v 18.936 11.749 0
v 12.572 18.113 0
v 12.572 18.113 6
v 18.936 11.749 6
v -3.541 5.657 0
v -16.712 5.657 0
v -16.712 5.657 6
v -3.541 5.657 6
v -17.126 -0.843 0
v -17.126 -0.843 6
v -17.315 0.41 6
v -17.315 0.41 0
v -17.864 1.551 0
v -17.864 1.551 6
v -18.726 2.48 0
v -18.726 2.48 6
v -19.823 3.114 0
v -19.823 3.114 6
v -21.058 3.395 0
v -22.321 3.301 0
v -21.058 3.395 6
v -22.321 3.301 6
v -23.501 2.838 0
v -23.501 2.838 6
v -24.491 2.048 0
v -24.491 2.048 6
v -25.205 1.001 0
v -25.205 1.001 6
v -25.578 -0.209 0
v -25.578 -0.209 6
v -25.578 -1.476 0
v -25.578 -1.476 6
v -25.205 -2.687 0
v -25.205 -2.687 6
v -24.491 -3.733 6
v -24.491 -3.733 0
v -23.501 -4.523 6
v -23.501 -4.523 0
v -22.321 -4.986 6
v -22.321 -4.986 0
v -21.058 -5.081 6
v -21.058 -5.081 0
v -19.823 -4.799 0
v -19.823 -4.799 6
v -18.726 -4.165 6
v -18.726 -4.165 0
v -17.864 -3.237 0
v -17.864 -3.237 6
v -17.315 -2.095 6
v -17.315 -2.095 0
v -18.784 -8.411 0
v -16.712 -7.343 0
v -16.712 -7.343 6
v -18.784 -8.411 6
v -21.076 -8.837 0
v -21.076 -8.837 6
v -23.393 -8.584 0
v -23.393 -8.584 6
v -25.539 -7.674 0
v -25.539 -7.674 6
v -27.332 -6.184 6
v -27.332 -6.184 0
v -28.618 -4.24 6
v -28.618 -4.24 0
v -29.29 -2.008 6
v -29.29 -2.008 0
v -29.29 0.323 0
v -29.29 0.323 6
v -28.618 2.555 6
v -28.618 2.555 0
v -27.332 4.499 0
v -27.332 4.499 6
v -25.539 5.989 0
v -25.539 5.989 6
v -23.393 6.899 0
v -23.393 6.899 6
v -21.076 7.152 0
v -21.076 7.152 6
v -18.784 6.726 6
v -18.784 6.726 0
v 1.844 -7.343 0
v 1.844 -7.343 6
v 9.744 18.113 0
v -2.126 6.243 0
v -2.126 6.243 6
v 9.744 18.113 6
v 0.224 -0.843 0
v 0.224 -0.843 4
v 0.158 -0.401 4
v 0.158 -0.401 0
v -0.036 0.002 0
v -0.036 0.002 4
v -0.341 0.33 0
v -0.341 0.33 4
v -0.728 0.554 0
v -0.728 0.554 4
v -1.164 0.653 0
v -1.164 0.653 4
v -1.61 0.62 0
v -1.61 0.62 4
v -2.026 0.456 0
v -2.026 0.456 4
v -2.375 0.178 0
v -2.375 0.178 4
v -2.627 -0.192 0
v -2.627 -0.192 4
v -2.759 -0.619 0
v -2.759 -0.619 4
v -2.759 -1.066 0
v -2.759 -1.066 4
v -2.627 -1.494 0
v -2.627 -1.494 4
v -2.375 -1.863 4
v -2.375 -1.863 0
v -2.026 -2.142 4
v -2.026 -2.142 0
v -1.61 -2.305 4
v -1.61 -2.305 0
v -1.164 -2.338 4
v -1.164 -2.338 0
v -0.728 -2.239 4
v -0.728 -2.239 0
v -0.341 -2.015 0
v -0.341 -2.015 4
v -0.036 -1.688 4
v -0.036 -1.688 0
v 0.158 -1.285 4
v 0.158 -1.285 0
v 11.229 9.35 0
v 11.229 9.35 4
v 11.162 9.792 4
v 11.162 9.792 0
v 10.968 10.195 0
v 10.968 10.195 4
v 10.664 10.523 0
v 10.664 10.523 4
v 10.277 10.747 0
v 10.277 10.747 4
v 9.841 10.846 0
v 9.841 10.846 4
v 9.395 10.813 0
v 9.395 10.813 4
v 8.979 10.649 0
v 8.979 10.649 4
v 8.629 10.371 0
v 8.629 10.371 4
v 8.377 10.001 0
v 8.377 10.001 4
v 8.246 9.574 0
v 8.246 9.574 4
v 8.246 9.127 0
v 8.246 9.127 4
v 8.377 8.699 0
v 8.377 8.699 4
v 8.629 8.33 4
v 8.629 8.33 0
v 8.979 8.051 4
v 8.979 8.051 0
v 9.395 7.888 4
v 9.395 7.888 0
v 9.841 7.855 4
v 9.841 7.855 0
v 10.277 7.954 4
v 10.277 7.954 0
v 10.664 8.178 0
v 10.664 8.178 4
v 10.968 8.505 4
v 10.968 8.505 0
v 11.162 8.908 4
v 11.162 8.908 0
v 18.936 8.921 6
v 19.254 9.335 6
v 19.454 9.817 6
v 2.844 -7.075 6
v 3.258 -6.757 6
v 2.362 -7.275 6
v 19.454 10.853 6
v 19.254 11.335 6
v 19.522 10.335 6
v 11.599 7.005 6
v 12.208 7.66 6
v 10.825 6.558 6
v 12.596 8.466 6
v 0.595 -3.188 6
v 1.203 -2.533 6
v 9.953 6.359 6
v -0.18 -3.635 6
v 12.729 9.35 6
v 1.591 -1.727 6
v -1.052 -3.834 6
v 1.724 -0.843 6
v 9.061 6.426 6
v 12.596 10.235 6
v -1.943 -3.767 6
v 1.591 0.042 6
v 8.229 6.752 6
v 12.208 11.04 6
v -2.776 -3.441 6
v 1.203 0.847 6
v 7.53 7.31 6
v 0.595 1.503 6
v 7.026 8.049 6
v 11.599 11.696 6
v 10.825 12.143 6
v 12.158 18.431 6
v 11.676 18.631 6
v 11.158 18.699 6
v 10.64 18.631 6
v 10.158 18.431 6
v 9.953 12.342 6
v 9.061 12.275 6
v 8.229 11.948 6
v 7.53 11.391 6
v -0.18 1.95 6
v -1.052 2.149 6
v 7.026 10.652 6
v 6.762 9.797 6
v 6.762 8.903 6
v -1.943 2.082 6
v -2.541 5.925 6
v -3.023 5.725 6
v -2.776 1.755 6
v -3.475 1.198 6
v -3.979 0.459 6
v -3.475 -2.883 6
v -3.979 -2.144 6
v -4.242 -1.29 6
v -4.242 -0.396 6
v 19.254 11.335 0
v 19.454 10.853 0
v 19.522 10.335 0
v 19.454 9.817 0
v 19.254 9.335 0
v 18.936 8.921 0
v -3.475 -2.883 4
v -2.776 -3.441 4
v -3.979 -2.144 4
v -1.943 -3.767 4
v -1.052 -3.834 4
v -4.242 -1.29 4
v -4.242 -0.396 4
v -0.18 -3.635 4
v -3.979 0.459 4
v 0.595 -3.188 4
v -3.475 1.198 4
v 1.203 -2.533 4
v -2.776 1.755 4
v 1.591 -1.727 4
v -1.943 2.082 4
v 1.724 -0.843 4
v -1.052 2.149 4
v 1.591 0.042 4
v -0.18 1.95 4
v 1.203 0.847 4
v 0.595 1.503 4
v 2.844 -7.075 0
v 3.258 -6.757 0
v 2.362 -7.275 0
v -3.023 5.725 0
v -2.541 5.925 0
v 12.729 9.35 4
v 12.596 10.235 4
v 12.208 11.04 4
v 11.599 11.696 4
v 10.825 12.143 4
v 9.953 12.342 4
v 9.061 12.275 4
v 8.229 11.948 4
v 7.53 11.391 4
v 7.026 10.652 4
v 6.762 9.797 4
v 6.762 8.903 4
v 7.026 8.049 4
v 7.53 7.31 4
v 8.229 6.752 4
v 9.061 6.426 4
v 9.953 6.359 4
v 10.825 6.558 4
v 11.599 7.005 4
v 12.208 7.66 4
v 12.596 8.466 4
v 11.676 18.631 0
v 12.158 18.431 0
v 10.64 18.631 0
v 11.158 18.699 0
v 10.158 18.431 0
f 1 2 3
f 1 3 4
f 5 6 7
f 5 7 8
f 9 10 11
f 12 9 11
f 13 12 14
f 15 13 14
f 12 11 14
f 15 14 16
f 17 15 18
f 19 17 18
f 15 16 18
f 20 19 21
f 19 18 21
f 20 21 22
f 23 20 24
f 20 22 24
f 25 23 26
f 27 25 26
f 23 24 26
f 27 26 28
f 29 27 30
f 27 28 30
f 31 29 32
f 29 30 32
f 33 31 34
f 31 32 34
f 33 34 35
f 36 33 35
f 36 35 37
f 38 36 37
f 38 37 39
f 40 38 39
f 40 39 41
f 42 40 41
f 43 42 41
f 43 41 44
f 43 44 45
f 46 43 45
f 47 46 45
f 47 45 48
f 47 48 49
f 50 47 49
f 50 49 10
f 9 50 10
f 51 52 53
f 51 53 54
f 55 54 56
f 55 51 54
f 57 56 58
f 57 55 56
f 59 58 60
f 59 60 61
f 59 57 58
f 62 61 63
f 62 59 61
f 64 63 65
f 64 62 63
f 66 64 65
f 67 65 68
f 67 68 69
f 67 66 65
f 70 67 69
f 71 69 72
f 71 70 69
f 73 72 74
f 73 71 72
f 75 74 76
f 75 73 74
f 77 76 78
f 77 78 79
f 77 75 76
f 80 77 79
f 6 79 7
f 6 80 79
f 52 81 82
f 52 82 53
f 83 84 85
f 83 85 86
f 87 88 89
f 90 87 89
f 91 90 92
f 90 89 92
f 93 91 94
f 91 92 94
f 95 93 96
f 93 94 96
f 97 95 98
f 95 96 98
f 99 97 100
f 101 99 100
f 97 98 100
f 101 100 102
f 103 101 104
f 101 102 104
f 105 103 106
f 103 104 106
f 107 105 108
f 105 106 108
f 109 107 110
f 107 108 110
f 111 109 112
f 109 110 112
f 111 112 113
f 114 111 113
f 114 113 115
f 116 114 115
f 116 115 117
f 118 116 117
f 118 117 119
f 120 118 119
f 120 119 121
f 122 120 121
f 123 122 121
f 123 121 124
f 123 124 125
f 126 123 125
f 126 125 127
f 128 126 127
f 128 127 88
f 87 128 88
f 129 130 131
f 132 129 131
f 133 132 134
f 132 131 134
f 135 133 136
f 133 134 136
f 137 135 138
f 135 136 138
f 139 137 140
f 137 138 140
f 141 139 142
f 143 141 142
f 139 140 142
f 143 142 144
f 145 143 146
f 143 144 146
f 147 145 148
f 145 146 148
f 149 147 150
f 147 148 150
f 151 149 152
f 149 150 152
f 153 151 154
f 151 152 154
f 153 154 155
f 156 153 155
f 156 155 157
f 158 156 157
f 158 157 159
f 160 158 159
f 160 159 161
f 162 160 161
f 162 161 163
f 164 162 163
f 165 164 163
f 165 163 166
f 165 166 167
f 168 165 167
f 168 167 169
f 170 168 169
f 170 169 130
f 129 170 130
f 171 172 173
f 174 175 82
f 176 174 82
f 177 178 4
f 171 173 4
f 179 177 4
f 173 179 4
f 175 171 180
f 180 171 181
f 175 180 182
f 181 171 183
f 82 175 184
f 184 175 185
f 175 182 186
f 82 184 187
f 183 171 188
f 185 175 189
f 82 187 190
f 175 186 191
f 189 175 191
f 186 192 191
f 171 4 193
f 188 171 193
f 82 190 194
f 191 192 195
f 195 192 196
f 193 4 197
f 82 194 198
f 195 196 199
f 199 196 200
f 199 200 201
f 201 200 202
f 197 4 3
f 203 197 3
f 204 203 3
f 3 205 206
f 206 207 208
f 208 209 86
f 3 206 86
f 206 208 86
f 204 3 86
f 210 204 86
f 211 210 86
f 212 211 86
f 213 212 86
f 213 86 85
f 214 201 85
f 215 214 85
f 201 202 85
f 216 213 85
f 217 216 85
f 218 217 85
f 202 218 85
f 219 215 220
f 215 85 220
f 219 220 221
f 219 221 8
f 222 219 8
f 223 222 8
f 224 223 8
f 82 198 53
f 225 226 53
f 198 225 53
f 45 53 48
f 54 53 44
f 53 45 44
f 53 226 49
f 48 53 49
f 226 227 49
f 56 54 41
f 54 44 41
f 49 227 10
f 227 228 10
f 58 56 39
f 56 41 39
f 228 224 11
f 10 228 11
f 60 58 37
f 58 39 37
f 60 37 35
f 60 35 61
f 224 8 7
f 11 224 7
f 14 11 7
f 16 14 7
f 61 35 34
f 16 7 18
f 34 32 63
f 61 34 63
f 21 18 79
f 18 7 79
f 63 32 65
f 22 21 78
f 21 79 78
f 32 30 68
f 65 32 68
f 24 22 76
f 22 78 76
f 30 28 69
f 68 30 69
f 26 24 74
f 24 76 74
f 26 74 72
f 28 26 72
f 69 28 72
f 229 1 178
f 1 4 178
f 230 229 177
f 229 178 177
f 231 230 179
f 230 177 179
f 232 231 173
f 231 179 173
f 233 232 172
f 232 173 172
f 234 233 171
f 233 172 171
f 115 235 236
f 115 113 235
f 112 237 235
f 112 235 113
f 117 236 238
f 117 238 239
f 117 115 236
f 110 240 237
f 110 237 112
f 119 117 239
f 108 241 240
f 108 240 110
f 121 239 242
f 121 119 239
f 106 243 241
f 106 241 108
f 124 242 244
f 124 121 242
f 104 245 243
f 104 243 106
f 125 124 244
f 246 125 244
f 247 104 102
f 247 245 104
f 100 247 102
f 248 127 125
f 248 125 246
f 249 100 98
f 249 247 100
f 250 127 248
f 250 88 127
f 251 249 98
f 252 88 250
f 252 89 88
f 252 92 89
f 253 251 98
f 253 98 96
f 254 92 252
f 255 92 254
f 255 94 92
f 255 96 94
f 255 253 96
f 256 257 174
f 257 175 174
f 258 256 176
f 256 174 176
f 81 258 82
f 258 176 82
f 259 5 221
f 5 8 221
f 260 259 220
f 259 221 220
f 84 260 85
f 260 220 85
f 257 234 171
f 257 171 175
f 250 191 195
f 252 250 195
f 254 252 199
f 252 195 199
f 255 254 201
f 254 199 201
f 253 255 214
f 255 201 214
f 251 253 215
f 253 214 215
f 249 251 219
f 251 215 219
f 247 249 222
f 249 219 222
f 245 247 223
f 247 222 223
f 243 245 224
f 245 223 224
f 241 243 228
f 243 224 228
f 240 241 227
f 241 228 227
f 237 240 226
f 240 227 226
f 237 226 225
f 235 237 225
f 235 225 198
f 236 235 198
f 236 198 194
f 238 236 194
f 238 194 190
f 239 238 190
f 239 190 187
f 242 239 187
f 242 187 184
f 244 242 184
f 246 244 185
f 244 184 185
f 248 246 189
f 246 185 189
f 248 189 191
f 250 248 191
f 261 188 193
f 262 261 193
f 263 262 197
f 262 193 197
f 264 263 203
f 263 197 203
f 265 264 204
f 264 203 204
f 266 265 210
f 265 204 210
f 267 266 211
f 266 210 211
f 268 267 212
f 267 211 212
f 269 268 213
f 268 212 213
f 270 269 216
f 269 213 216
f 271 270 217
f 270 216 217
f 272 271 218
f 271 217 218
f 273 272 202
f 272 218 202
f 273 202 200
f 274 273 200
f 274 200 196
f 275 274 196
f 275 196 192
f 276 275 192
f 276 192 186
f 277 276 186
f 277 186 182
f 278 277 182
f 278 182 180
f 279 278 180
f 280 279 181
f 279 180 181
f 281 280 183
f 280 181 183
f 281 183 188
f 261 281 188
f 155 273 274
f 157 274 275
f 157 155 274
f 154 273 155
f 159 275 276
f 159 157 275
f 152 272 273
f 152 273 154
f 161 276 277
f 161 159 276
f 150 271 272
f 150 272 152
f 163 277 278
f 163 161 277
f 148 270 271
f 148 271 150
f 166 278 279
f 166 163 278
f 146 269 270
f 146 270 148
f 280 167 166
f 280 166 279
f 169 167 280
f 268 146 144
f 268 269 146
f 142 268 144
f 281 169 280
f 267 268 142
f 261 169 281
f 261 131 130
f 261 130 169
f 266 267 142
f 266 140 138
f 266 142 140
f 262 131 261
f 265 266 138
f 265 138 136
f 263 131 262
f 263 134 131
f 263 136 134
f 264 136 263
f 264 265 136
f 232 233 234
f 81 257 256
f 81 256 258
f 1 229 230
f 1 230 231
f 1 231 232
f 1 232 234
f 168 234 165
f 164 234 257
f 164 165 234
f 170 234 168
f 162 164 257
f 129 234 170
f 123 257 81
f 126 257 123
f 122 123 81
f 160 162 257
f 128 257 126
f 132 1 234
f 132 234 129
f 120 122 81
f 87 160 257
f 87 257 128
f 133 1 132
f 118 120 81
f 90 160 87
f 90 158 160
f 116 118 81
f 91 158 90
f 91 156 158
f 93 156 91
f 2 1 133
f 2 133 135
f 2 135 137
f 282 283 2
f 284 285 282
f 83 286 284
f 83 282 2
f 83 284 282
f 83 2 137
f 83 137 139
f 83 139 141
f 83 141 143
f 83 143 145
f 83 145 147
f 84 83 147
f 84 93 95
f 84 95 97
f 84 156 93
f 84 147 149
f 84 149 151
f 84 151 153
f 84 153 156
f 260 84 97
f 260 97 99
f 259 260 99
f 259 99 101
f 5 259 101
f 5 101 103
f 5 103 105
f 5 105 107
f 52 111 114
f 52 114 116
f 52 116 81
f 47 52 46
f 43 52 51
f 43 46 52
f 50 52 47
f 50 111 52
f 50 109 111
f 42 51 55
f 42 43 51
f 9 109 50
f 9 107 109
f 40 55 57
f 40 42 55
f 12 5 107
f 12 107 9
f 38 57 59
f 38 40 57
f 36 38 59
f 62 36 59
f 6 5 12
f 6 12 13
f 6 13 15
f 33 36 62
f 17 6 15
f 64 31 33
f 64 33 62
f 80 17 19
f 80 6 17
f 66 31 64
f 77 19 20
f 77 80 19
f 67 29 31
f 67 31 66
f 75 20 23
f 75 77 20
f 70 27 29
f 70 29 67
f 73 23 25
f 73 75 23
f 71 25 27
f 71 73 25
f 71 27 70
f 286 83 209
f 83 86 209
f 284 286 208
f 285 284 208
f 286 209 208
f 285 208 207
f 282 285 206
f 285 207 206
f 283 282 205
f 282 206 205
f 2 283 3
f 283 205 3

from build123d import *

# Parameters (mm, degrees)
BOSS_EXTRU_1_DEPTH      = 6
CONG_1_R                = 2
ESQUISSE2_R             = 4.25
ESQUISSE2_R_2           = 1.5
ENL_V_MAT_EXTRU_1_DEPTH = 36.335346375
ESQUISSE3_R             = 3
ENL_V_MAT_EXTRU_2_DEPTH = 2


with BuildPart() as part:
    # Esquisse1 → Boss.-Extru.1 (new body)
    with BuildSketch(Plane.XY):
        with BuildLine():
            Line((-16.712083242, 5.657318013), (-2.712083242, 5.657318013))
            Line((-2.712083242, 5.657318013), (11.157974444, 19.527375698))
            Line((11.157974444, 19.527375698), (20.350362599, 10.334987543))
            Line((20.350362599, 10.334987543), (2.672693069, -7.342681987))
            Line((2.672693069, -7.342681987), (-16.712083242, -7.342681987))
            ThreePointArc((-16.712083242, -7.342681987), (-29.375772768, -0.842681987), (-16.712083242, 5.657318013))
        make_face()
    extrude(amount=BOSS_EXTRU_1_DEPTH)

    # Congé1
    cong_1_edges = [part.edges().sort_by_distance(p)[0] for p in [
        (-2.712083242, 5.657318013, 3),
        (11.157974444, 19.527375698, 3),
        (20.350362599, 10.334987543, 3),
        (2.672693069, -7.342681987, 3),
    ]]
    fillet(cong_1_edges, radius=CONG_1_R)

    # Esquisse2 → Enlèv. mat.-Extru.1 (cut, through all)
    with BuildSketch(Plane.XY.offset(6)):
        with Locations((-21.375772768, -0.842681987)):
            Circle(ESQUISSE2_R)
        with Locations((-1.275772768, -0.842681987)):
            Circle(ESQUISSE2_R_2)
        with Locations((9.728897785, 9.350316885)):
            Circle(ESQUISSE2_R_2)
    extrude(amount=-ENL_V_MAT_EXTRU_1_DEPTH, mode=Mode.SUBTRACT)

    # Esquisse3 → Enlèv. mat.-Extru.2 (cut)
    with BuildSketch(Plane.XY.offset(6)):
        with Locations((-1.275772768, -0.842681987)):
            Circle(ESQUISSE3_R)
        with Locations((9.728897785, 9.350316885)):
            Circle(ESQUISSE3_R)
    extrude(amount=-ENL_V_MAT_EXTRU_2_DEPTH, mode=Mode.SUBTRACT)


solid = part.part
